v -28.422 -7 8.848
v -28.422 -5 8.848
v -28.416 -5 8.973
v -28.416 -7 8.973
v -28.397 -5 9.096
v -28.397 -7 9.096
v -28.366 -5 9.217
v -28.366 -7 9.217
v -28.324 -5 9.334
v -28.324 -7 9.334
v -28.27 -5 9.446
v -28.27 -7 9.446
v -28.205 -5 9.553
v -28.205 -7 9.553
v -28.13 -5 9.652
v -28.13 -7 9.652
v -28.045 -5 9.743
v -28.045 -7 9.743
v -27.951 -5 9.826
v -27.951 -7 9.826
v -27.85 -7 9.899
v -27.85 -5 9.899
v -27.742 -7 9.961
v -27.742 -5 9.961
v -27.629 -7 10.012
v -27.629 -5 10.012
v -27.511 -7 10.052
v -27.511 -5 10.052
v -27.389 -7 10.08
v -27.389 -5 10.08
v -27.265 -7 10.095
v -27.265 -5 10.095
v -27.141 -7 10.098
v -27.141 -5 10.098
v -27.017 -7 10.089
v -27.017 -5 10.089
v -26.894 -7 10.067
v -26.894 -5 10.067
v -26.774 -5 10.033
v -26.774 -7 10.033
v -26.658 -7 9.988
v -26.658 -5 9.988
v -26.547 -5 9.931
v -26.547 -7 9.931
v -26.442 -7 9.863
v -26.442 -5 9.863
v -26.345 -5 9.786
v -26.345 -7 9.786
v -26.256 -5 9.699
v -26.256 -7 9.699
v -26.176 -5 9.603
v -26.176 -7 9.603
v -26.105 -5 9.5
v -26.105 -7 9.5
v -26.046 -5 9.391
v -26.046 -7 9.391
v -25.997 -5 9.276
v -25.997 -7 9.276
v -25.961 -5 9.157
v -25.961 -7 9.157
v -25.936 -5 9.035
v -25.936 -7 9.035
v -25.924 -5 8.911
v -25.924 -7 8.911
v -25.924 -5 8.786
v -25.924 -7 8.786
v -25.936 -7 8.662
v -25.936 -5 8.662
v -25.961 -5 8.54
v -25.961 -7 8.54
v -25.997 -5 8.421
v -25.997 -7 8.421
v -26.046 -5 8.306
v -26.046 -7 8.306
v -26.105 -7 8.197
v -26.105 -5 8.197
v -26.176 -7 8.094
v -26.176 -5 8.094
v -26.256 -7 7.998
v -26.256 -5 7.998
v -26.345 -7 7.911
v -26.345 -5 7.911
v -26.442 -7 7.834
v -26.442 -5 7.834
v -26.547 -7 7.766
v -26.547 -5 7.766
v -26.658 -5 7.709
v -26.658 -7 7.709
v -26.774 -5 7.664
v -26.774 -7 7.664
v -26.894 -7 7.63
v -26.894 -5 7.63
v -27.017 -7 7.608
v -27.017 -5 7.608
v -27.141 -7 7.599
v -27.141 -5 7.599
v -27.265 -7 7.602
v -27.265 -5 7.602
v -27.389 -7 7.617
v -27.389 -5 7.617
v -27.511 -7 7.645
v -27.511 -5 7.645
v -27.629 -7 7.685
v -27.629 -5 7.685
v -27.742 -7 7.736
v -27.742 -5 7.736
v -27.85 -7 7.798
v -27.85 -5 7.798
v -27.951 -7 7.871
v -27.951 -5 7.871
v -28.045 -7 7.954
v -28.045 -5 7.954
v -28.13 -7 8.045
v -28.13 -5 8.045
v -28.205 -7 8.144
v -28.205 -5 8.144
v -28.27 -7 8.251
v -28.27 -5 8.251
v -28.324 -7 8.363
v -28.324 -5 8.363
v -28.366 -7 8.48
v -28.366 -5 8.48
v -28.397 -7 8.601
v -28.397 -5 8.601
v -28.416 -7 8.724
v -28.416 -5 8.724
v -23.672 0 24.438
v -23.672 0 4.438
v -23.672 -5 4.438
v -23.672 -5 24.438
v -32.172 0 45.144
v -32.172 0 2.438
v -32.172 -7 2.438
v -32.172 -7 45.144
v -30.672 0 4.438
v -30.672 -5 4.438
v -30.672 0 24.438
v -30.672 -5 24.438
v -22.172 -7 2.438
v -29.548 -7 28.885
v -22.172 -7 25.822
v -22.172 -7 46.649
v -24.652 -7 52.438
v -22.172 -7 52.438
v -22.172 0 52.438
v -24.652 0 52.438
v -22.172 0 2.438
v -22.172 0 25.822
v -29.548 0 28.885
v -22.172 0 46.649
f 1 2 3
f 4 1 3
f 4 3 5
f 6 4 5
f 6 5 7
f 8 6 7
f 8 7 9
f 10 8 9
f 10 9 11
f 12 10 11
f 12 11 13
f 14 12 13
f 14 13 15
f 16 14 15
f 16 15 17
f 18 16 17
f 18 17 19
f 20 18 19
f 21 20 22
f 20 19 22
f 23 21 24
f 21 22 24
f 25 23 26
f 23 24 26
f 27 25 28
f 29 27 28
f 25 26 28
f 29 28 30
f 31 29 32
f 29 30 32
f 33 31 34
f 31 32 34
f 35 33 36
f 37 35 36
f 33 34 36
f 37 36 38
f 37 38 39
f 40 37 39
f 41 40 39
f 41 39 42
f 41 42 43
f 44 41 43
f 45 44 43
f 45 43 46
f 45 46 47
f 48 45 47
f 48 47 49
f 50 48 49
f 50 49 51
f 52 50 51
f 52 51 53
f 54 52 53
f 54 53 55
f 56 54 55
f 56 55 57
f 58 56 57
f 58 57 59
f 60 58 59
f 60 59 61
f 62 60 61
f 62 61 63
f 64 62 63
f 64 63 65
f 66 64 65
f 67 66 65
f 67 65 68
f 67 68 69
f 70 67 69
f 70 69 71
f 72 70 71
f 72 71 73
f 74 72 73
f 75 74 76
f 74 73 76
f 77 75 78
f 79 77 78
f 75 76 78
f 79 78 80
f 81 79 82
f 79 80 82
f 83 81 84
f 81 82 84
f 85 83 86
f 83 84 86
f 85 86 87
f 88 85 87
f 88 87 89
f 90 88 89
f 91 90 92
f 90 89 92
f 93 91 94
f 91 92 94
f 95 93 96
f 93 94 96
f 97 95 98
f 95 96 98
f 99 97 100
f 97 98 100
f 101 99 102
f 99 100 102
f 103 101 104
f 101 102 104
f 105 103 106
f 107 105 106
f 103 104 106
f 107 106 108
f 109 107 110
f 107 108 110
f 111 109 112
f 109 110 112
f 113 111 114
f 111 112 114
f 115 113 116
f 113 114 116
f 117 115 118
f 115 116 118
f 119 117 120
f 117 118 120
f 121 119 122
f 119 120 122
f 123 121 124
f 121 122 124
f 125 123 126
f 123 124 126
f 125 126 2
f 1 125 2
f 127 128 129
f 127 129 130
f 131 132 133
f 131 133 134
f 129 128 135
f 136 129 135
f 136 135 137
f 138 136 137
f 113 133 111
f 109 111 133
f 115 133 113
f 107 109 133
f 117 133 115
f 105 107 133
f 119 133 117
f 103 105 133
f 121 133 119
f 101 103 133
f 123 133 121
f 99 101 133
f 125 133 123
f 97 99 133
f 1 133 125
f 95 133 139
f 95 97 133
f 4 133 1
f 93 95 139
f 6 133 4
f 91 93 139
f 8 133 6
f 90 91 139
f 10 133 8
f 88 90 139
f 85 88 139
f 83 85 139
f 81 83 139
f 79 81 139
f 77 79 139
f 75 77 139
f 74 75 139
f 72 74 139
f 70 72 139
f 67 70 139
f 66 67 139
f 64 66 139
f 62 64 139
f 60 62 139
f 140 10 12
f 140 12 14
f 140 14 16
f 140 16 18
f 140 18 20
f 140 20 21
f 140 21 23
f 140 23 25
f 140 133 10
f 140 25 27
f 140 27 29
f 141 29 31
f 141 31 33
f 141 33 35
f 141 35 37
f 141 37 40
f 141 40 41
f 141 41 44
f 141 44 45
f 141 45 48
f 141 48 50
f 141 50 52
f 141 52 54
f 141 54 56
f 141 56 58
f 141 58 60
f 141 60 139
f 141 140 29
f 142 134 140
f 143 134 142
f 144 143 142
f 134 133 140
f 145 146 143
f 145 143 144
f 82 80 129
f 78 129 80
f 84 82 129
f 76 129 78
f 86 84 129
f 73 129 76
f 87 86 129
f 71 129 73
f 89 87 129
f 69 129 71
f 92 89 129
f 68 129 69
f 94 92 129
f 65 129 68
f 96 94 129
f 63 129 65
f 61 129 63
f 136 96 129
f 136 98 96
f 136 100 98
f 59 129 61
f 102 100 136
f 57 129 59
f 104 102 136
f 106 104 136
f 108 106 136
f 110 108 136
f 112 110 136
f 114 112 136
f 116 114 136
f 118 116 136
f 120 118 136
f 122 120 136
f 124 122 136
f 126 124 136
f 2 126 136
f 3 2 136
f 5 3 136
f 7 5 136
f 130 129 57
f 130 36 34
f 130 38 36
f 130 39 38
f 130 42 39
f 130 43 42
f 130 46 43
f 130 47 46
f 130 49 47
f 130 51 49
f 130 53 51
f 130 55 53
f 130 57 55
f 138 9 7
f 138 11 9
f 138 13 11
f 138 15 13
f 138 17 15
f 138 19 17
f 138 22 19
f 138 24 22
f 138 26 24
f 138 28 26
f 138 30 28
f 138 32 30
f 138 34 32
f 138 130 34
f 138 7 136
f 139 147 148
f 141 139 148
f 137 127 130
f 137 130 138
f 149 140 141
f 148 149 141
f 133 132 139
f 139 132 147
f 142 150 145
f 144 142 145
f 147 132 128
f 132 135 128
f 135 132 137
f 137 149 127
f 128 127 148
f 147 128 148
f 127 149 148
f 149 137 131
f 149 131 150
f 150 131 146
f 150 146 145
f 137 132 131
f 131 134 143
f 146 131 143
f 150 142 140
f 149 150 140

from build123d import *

# Parameters (mm, degrees)
F0_W     = 10
F0_H     = 50
F1_DEPTH = 7
F2_W     = 7
F2_H     = 20
F3_DEPTH = 5
F4_R     = 1.25
F5_DEPTH = 2.001
F7_DEPTH = 7.001


with BuildPart() as f1:
    # F0 (on Front) → F1 (new body)
    with BuildSketch(Plane.XZ):
        with Locations((-27.172005, 27.438496)):
            Rectangle(F0_W, F0_H)
    extrude(amount=F1_DEPTH)

    # F2 (on face) → F3 (cut)
    with BuildSketch(Plane(origin=(0, 0, 0), x_dir=(-1, 0, 0), z_dir=(0, 1, 0))):
        with Locations((27.172005, 14.438496)):
            Rectangle(F2_W, F2_H)
    extrude(amount=-F3_DEPTH, mode=Mode.SUBTRACT)

    # F4 (on face) → F5 (cut, through all)
    with BuildSketch(Plane(origin=(0, -5, 0), x_dir=(-1, 0, 0), z_dir=(0, 1, 0))):
        with Locations((27.172005, 8.848496)):
            Circle(F4_R)
    extrude(amount=-F5_DEPTH, mode=Mode.SUBTRACT)

    # F6 (on face) → F7 (cut, through all)
    with BuildSketch(Plane.XZ.offset(7)):
        Polygon((-32.172005, 52.438496), (-32.172005, 45.144096), (-24.652329, 52.438496), align=None)
        Polygon((-29.548446, 28.8854), (-22.172005, 25.822317), (-22.172005, 46.649169), align=None)
    extrude(amount=-F7_DEPTH, mode=Mode.SUBTRACT)


solid = f1.part
